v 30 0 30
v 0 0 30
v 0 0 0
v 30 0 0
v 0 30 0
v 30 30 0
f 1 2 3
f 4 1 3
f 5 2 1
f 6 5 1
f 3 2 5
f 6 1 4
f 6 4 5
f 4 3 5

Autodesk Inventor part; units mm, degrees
ref_plane "YZ Plane" through (0, 0, 0) normal (1, 0, 0) x (0, 1, 0)
ref_plane "XZ Plane" through (0, 0, 0) normal (0, 1, 0) x (-1, 0, 0)
ref_plane "XY Plane" through (0, 0, 0) normal (0, 0, 1) x (1, 0, 0)
sketch "Sketch1" plane through (0, 0, 0) normal (1, 0, 0) x (0, 1, 0)
  line L0 (0, 0) -> (30, 0)
  line L1 (30, 0) -> (30, 30)
  line L2 (30, 30) -> (0, 30)
  line L3 (0, 30) -> (0, 0)
  dimension "d0" = 30
  dimension "d1" = 30
extrude "Extrusion1" add sketch "Sketch1" along normal blind 30
chamfer "Chamfer1" distance 30 angle 45 1 edges at (15, 30, 30)
properties part number "edge"
